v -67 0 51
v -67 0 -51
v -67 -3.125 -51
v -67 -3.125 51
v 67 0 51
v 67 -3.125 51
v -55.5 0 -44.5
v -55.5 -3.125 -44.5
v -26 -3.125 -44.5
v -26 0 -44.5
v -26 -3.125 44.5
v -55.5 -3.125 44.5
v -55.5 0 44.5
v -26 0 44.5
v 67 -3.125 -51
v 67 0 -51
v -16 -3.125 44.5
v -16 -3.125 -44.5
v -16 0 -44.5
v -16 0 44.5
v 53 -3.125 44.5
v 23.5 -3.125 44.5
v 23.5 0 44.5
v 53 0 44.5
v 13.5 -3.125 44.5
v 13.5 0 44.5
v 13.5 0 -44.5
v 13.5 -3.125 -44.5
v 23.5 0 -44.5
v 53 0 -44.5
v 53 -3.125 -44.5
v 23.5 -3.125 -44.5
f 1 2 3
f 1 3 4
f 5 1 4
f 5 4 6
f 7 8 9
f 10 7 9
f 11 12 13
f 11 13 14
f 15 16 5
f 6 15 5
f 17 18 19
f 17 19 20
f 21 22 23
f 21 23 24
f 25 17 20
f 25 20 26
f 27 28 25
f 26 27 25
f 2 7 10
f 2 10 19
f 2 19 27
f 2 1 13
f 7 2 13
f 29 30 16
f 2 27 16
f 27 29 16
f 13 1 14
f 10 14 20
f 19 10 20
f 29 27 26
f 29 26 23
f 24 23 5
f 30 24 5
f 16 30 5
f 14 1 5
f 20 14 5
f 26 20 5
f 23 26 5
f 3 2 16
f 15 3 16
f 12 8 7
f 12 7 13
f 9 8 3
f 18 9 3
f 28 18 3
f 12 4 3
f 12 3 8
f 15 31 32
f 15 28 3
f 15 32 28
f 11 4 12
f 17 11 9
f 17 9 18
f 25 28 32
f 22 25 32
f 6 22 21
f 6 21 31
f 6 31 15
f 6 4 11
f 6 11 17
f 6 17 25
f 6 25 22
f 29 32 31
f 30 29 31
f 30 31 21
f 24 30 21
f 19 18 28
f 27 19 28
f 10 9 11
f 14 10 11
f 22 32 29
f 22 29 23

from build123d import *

# Parameters (mm, degrees)
F0_W     = 134
F0_H     = 102
F1_DEPTH = 3.125
F2_W     = 29.5
F2_H     = 79.6
F3_DEPTH = 3.175
F5_W     = 29.5
F5_H     = 4.7
F6_DEPTH = 3.175


with BuildPart() as f1:
    # F0 (on Front) → F1 (new body)
    with BuildSketch(Plane.XZ):
        Rectangle(F0_W, F0_H)
    extrude(amount=F1_DEPTH)

    # F2 (on face) → F3 (cut)
    with BuildSketch(Plane.XZ.offset(3.125)):
        with Locations((-40.75, 0)):
            Rectangle(F2_W, F2_H)
        with Locations((38.25, 0)):
            Rectangle(F2_W, F2_H)
        with Locations((-1.25, 0)):
            Rectangle(F2_W, F2_H)
    extrude(amount=-F3_DEPTH, mode=Mode.SUBTRACT)

    # F5 (on face) → F6 (cut)
    with BuildSketch(Plane.XZ.offset(3.125)):
        with Locations((-40.75, 42.15)):
            Rectangle(F5_W, F5_H)
        with Locations((-1.25, 42.15)):
            Rectangle(F5_W, F5_H)
        with Locations((38.25, 42.15)):
            Rectangle(F5_W, F5_H)
        with Locations((38.25, -42.15)):
            Rectangle(F5_W, F5_H)
        with Locations((-1.25, -42.15)):
            Rectangle(F5_W, F5_H)
        with Locations((-40.75, -42.15)):
            Rectangle(F5_W, F5_H)
    extrude(amount=-F6_DEPTH, mode=Mode.SUBTRACT)


solid = f1.part
